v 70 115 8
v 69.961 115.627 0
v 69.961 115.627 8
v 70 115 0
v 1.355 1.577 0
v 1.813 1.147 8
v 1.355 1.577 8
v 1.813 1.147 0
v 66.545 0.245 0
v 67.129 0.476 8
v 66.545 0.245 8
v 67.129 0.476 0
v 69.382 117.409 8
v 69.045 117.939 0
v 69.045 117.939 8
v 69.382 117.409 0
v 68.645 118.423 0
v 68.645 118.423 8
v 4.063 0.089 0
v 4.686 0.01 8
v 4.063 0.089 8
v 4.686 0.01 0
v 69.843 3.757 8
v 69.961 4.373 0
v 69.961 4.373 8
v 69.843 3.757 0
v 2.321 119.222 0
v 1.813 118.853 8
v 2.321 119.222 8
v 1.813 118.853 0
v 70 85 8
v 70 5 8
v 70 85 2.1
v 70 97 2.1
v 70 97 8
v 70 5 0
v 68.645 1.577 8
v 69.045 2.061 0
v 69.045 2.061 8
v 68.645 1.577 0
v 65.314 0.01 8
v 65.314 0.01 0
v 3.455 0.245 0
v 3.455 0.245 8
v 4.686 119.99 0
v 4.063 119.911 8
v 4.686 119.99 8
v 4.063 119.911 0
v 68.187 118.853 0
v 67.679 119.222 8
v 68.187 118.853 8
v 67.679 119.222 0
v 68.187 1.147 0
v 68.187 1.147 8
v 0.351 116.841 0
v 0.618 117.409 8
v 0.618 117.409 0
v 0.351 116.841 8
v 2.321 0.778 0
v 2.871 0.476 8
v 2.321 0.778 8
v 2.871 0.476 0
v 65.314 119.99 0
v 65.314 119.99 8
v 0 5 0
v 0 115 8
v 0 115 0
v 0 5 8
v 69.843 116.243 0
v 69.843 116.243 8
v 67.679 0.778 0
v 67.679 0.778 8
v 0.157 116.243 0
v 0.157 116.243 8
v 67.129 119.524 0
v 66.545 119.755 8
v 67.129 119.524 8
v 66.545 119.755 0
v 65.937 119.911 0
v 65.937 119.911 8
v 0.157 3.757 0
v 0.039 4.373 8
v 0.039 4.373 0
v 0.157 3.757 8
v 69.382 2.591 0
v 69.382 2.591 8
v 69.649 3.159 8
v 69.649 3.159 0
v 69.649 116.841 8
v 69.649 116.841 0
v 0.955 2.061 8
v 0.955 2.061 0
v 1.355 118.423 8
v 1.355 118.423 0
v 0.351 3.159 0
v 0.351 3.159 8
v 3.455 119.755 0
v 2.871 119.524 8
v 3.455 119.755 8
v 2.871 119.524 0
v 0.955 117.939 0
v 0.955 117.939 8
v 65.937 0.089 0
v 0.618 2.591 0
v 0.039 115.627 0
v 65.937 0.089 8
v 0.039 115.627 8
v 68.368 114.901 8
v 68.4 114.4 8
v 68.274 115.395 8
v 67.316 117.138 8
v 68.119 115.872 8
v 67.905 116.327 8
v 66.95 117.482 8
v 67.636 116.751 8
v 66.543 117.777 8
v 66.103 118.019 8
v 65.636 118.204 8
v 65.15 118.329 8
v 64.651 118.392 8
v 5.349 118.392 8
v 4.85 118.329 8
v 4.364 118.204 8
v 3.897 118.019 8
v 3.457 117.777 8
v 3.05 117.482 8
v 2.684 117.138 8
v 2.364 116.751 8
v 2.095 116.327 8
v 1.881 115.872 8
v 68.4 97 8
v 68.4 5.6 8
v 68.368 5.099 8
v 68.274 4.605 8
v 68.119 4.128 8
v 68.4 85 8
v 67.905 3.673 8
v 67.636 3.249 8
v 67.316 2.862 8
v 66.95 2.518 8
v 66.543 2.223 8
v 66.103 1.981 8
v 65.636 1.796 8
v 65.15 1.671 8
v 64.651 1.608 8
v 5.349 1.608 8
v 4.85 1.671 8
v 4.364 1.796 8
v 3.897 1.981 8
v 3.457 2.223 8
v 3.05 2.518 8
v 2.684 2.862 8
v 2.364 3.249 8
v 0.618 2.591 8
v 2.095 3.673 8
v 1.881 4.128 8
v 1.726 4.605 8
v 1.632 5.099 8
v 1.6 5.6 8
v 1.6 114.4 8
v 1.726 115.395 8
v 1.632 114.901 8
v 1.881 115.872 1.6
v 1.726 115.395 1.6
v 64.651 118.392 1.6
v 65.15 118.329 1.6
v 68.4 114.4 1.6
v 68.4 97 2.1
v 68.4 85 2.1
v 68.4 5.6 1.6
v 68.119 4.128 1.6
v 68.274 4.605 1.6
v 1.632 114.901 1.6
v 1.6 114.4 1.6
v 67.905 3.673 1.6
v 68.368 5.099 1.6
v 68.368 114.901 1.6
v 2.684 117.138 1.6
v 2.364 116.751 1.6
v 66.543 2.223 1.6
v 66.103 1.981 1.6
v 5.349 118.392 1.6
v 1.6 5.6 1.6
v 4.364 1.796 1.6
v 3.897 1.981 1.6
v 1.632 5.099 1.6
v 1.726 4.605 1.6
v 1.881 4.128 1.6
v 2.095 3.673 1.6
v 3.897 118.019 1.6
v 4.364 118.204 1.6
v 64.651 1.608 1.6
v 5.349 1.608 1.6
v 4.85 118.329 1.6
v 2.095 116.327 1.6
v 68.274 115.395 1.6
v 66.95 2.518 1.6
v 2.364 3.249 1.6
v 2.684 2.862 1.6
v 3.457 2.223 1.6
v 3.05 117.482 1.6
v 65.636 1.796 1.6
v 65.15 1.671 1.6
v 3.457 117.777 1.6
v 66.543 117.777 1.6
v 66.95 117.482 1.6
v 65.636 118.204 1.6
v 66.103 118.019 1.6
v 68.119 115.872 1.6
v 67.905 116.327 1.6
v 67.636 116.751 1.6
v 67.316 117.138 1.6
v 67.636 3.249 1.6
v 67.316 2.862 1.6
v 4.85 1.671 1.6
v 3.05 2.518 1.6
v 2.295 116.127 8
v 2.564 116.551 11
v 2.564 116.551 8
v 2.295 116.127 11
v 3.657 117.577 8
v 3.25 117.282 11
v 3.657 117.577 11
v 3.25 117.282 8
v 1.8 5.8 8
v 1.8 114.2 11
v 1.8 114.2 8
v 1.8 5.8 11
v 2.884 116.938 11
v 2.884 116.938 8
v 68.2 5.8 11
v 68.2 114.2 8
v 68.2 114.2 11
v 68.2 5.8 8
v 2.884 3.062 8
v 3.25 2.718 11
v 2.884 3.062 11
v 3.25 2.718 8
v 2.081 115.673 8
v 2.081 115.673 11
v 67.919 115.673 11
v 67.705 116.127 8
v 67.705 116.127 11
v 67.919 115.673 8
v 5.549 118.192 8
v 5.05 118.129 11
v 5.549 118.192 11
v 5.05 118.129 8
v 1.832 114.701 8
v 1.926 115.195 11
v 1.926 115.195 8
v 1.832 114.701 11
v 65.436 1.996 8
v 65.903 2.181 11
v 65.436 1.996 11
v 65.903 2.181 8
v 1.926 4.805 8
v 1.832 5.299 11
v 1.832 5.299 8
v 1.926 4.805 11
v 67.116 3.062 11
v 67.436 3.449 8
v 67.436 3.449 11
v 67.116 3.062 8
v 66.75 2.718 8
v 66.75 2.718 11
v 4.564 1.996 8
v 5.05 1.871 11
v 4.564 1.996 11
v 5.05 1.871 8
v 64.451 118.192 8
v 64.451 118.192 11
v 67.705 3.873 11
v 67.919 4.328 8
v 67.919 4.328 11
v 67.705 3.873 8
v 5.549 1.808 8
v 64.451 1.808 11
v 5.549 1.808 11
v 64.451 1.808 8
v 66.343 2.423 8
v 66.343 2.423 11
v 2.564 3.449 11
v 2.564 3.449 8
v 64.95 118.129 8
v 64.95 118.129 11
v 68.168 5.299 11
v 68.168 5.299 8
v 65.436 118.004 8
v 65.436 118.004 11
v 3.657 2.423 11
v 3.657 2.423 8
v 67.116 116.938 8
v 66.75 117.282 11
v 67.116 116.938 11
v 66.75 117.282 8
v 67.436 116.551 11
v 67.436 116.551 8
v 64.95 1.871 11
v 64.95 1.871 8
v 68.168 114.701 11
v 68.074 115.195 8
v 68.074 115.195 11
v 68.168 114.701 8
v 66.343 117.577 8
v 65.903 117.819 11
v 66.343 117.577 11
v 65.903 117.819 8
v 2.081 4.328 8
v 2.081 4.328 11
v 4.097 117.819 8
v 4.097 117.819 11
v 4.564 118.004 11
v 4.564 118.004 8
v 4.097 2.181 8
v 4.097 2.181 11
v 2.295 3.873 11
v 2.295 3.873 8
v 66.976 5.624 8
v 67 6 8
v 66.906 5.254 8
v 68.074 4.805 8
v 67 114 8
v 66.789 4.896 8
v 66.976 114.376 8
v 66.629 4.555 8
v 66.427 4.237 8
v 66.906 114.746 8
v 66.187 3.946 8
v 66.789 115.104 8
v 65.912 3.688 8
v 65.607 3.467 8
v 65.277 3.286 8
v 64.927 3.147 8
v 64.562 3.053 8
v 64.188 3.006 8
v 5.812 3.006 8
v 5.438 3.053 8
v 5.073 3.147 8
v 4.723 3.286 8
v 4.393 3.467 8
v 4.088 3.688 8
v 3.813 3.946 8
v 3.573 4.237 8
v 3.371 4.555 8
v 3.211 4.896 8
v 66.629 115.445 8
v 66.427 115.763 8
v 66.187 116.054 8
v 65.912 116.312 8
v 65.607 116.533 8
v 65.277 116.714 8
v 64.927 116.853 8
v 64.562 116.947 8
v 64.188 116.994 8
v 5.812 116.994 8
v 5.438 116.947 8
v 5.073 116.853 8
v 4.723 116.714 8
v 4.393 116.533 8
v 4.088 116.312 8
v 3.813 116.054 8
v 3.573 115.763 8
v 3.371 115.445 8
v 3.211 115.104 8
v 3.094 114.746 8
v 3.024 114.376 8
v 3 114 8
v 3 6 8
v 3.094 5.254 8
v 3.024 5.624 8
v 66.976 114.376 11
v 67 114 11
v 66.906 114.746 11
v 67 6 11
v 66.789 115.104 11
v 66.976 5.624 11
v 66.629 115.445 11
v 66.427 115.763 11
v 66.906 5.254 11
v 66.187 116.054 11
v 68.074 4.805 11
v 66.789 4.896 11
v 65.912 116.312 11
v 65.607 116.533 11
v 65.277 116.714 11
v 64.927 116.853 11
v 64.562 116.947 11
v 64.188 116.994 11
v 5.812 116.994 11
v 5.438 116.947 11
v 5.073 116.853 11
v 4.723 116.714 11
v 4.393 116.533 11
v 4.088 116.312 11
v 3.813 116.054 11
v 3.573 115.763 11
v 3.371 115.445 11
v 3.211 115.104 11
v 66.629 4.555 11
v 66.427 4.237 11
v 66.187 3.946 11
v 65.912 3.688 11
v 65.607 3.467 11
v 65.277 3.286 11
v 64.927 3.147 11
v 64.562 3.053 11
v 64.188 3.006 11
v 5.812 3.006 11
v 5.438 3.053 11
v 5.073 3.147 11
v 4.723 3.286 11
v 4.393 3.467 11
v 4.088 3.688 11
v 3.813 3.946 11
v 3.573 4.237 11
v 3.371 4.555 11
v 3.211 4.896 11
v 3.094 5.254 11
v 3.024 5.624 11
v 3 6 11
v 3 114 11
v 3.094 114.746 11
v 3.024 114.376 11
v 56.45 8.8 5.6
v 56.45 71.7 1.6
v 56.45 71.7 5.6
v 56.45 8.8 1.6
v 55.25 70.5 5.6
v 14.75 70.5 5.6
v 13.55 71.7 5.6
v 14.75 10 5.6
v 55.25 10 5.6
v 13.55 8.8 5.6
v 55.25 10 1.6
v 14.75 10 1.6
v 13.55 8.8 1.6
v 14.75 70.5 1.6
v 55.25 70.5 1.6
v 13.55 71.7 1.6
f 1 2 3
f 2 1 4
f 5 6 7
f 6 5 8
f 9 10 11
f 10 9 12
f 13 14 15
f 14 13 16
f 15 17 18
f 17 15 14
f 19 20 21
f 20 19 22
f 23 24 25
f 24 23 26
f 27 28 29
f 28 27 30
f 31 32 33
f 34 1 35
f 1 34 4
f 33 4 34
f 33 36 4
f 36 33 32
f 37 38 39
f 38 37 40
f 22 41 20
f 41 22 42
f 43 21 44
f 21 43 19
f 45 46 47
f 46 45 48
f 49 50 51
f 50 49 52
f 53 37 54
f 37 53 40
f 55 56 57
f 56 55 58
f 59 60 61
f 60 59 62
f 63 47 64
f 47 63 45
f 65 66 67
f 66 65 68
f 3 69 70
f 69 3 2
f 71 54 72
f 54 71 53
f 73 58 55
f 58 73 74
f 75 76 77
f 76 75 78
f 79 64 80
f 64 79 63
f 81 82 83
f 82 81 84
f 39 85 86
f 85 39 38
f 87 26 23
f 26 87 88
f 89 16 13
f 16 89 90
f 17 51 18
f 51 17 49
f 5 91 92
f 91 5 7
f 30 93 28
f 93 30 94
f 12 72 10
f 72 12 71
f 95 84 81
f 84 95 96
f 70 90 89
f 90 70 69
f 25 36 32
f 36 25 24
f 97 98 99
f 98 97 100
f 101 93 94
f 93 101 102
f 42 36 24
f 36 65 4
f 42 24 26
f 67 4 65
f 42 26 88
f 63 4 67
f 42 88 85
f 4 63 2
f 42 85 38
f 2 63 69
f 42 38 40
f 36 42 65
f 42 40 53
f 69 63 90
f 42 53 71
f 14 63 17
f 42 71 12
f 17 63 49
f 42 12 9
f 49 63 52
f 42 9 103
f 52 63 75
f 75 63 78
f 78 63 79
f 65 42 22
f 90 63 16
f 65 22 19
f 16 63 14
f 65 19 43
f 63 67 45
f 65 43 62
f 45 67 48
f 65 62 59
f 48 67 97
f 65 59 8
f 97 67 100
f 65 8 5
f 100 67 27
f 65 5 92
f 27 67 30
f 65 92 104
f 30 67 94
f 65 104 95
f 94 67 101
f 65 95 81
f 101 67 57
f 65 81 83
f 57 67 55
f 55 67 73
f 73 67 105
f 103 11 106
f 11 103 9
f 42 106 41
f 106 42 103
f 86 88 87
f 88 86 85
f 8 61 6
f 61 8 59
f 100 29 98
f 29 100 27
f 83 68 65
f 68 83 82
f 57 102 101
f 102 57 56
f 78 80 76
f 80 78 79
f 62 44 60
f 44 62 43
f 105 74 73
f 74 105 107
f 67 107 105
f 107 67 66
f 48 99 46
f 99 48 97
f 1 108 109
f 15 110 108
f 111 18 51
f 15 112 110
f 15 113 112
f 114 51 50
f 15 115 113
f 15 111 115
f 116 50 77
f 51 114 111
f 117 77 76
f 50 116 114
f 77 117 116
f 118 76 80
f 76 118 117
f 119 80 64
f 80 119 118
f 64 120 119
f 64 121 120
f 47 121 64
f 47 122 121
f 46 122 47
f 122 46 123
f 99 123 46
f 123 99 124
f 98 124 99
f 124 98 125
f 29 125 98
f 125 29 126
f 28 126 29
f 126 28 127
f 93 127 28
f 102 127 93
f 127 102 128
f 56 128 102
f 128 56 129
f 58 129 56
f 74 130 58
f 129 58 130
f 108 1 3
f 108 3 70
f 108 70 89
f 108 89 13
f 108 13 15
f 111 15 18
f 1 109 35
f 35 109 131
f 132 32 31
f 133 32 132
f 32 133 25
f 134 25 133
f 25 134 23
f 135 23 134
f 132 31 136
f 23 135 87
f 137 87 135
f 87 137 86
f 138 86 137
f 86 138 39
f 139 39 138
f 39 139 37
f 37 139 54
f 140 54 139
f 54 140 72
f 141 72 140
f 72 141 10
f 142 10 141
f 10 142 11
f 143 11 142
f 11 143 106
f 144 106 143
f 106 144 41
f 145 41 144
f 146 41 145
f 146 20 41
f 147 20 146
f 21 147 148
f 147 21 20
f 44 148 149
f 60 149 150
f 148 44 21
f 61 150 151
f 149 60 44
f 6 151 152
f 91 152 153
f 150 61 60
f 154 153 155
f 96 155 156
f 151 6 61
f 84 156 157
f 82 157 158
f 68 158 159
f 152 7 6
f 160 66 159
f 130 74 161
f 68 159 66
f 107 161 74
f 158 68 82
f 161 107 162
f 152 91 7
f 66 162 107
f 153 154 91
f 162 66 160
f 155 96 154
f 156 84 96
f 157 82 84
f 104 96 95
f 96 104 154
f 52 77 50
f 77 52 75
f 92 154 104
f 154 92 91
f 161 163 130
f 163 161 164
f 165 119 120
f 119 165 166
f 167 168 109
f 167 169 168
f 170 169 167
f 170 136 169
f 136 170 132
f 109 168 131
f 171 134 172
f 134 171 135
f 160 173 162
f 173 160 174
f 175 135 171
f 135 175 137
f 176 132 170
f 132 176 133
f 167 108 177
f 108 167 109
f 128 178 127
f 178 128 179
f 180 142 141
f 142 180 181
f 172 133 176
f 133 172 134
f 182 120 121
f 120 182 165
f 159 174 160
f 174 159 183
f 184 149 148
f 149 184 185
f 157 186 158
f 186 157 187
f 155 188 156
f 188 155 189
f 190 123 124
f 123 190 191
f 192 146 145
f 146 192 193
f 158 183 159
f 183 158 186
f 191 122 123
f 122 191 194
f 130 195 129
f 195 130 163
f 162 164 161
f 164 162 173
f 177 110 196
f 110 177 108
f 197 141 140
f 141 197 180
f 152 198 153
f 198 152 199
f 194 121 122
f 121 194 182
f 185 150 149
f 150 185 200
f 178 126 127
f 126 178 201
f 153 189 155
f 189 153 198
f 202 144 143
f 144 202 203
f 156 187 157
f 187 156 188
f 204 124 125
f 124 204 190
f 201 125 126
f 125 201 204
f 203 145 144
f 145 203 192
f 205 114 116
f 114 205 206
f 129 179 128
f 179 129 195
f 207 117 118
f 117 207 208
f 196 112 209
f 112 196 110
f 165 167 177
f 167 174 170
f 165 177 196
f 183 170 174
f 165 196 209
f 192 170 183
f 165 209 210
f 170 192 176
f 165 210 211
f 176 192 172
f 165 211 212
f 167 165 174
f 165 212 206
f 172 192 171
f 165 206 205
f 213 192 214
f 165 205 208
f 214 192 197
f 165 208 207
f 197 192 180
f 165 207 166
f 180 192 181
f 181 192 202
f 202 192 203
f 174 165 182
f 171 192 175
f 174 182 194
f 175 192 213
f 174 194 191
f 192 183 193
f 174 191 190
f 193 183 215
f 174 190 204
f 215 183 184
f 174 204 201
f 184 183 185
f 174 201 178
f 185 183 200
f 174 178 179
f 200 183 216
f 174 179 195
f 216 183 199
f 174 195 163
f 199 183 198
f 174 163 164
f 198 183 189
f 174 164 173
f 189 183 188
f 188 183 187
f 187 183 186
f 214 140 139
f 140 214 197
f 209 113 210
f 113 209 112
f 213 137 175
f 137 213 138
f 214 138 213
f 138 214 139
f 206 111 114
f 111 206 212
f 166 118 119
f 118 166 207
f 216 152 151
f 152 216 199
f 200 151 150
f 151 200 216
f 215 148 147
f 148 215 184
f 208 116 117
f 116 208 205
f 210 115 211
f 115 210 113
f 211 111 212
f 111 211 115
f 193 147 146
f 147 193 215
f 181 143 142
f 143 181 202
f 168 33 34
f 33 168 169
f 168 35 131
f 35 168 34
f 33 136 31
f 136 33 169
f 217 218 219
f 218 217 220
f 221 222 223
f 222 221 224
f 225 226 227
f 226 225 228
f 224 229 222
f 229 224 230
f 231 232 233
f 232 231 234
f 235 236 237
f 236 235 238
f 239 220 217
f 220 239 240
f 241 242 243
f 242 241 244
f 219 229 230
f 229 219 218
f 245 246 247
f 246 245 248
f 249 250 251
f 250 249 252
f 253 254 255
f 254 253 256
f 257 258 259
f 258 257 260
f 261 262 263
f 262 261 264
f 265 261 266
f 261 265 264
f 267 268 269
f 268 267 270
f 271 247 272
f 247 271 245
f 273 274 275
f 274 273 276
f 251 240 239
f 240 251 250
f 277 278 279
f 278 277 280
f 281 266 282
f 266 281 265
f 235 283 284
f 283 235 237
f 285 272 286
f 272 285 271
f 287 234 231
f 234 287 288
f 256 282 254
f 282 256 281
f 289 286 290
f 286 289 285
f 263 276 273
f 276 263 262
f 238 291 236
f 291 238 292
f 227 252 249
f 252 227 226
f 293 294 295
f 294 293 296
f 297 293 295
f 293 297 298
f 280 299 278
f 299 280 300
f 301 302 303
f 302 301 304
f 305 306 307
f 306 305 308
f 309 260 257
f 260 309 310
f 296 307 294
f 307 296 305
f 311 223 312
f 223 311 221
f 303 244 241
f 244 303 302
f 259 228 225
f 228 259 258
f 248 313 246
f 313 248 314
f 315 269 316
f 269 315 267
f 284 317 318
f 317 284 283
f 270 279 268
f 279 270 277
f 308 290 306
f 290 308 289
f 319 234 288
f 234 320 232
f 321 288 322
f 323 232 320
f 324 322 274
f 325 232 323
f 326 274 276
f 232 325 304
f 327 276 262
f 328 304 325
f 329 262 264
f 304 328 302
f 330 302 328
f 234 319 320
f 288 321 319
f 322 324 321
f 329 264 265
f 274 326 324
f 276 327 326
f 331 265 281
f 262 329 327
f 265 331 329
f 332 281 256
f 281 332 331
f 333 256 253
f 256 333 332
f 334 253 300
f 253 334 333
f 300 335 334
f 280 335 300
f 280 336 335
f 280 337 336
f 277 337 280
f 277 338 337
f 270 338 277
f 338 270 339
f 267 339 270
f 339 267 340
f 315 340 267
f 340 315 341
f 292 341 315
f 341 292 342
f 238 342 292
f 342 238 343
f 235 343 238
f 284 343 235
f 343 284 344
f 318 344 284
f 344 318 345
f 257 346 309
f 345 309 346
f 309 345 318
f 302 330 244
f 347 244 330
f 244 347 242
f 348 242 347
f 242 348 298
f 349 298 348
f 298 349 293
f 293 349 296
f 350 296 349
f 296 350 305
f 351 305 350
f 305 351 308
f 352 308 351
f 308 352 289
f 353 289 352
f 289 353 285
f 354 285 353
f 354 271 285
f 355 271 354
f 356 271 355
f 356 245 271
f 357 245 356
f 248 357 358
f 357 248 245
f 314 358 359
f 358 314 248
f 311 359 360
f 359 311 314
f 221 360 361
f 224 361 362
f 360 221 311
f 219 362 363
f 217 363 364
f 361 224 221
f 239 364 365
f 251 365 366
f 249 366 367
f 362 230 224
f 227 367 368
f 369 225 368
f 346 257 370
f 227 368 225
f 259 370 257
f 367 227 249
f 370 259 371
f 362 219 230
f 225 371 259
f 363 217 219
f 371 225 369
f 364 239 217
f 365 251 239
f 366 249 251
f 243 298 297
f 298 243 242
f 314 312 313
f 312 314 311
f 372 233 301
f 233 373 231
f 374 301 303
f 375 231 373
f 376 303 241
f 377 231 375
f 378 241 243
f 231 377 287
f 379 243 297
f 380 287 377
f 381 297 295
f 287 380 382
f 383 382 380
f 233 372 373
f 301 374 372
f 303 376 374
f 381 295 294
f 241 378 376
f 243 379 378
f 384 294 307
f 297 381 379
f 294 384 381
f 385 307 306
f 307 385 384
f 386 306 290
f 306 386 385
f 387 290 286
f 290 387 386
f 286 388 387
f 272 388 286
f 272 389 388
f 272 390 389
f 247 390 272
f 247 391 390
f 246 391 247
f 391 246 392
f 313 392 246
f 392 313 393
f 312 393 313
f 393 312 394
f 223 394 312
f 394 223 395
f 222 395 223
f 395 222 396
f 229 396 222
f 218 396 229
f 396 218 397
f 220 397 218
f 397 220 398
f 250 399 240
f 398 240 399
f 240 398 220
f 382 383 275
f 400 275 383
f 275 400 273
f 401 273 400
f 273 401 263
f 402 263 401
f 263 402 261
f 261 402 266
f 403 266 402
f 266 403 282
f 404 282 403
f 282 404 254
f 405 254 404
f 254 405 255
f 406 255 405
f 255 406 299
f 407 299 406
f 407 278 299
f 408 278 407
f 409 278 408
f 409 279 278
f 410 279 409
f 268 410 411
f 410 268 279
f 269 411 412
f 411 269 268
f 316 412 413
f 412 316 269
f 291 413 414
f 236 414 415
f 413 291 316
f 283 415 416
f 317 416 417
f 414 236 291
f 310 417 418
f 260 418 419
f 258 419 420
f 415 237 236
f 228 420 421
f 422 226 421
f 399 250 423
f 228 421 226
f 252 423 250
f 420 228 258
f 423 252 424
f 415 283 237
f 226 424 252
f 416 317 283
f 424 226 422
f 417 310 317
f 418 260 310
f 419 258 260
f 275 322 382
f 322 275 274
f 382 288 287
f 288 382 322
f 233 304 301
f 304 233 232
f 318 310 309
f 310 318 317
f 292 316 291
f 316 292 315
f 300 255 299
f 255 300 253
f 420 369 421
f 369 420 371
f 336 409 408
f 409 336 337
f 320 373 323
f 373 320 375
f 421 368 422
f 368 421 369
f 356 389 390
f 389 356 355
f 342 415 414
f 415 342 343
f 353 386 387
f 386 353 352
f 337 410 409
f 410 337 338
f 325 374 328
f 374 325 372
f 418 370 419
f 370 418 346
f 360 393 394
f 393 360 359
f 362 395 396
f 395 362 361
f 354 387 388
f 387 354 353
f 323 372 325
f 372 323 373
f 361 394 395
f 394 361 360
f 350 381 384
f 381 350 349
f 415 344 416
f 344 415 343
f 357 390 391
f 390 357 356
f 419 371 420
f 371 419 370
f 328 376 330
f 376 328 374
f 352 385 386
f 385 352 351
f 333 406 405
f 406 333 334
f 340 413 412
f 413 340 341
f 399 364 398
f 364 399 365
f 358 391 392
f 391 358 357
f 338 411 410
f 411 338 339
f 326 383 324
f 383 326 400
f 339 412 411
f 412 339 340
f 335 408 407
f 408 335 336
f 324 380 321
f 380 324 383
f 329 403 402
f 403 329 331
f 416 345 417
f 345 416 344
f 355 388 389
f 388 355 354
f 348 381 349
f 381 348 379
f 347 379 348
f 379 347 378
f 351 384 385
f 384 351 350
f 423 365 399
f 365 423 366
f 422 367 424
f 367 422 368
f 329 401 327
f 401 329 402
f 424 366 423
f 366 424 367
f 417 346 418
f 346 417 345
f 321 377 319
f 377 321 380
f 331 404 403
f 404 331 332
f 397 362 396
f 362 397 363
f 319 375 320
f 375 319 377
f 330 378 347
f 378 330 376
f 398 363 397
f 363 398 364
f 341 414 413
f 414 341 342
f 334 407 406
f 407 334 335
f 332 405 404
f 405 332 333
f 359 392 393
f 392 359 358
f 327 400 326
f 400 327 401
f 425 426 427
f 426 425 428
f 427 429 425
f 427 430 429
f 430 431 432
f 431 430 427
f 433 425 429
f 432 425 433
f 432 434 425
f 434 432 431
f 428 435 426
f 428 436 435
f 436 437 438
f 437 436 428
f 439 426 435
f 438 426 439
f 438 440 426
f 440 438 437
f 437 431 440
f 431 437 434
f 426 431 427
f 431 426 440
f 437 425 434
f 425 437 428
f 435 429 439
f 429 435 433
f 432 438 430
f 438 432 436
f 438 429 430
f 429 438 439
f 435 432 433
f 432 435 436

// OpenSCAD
// ==========================================
// NOVA PAY EDC REPLICA - MASTER PROJECT FILE
// Optimized for Bambu Lab A1 Mini (No Supports, < 1 Hour)
// ==========================================

// --- GLOBAL DIMENSIONS ---
length = 120;
width = 70;
top_height = 20;     // Deep enough to clear ESP32 jumper wires
bottom_height = 8;
wall = 1.6;          // Fast printing (4 perimeters on 0.4mm nozzle)
radius = 5;
tolerance = 0.2;     // Snug friction fit gap

// Helper Module for Rounded Boxes (Keeps code clean)
module rounded_box(l, w, h, r) {
    hull() {
        translate([r, r, 0]) cylinder(h=h, r=r, $fn=50);
        translate([w-r, r, 0]) cylinder(h=h, r=r, $fn=50);
        translate([r, l-r, 0]) cylinder(h=h, r=r, $fn=50);
        translate([w-r, l-r, 0]) cylinder(h=h, r=r, $fn=50);
    }
}

// ==========================================
// 1. TOP HALF (FACEPLATE)
// ==========================================
module top_half() {
    screen_w = 34; 
    screen_h = 45;
    screen_offset_y = 20; 
    button_hole_d = 12.5; 
    button_spacing = 13.5;

    difference() {
        // Main Shell
        rounded_box(length, width, top_height, radius);
        
        // Hollow inside
        translate([wall, wall, wall])
            rounded_box(length - 2*wall, width - 2*wall, top_height, radius-1);
            
        // Screen Cutout
        translate([width/2 - screen_w/2, length/2 + screen_offset_y - screen_h/2, -1])
            cube([screen_w, screen_h, wall + 2]);
            
        // 5 Push Button Cutouts
        for(i=[-2:2]) {
            translate([width/2 + (i*button_spacing), 22, -1])
                cylinder(h=wall+2, d=button_hole_d, $fn=50);
        }
    }
}

// ==========================================
// 2. BOTTOM HALF (MOTHERBOARD & RFID TRAY)
// ==========================================
module bottom_half() {
    lip_height = 3;      
    lip_wall = 1.2; 
    usb_w = 12;
    usb_h = 6;
    usb_offset_y = 85; // Moved up to align with ESP32 in the Top Zone
    
    rfid_w = 40.5;
    rfid_l = 60.5;
    rfid_h = 4;
    
    union() {
        difference() {
            // Main Bottom Shell
            rounded_box(length, width, bottom_height, radius);
            
            // Hollow inside
            translate([wall, wall, wall])
                rounded_box(length - 2*wall, width - 2*wall, bottom_height, radius-1);
                
            // USB-C Port Cutout
            translate([width - wall - 1, usb_offset_y, wall + 0.5])
                cube([wall + 2, usb_w, usb_h]);
        }

        // Friction-Fit Lip
        translate([wall + tolerance, wall + tolerance, bottom_height])
        difference() {
            rounded_box(length - 2*(wall + tolerance), width - 2*(wall + tolerance), lip_height, radius - 1);
            
            translate([lip_wall, lip_wall, -1])
                rounded_box(length - 2*(wall + tolerance + lip_wall), width - 2*(wall + tolerance + lip_wall), lip_height + 2, radius - 2);
        }
        
        // RC522 Bracket (Centered X, Bottom Y)
        b_wall = 1.2;
        translate([(width - rfid_w) / 2, 10, wall]) 
        difference() {
            translate([-b_wall, -b_wall, 0])
                cube([rfid_w + 2*b_wall, rfid_l + 2*b_wall, rfid_h]);
            cube([rfid_w, rfid_l, rfid_h + 1]);
            // Huge center cutout for pins and saving plastic
            translate([3, 3, -1])
                cube([rfid_w - 6, rfid_l - 6, rfid_h + 2]);
        }
    }
}

// ==========================================
// 3. DESKTOP DOCK (KICKSTAND)
// ==========================================
module desktop_dock() {
    term_w = width + 1; // 1mm clearance 
    term_th = top_height + bottom_height + 1; 
    tilt = 20;

    difference() {
        hull() {
            translate([5, 5, 0]) cylinder(h=2, r=5, $fn=50);
            translate([term_w+5, 5, 0]) cylinder(h=2, r=5, $fn=50);
            translate([5, 60, 0]) cylinder(h=2, r=5, $fn=50);
            translate([term_w+5, 60, 0]) cylinder(h=2, r=5, $fn=50);
            
            translate([5, 50, 40]) cylinder(h=2, r=5, $fn=50);
            translate([term_w+5, 50, 40]) cylinder(h=2, r=5, $fn=50);
            
            translate([5, 5, 12]) cylinder(h=2, r=5, $fn=50);
            translate([term_w+5, 5, 12]) cylinder(h=2, r=5, $fn=50);
        }
        
        translate([5, 12, 8]) 
            rotate([tilt, 0, 0]) 
            cube([term_w, term_th, 60]);
            
        translate([15, 15, -1]) 
            cube([term_w - 20, 35, 30]);
    }
}

// ==========================================
// RENDER SECTION (Comment out what you don't need)
// ==========================================

// Faceplate
// top_half();

// Back Cover (Moved 80mm to the right for visibility)
//translate([80, 0, 0]) 
bottom_half();

// Dock (Moved 160mm to the right for visibility)
///translate([160, 0, 0]) 
//desktop_dock();
